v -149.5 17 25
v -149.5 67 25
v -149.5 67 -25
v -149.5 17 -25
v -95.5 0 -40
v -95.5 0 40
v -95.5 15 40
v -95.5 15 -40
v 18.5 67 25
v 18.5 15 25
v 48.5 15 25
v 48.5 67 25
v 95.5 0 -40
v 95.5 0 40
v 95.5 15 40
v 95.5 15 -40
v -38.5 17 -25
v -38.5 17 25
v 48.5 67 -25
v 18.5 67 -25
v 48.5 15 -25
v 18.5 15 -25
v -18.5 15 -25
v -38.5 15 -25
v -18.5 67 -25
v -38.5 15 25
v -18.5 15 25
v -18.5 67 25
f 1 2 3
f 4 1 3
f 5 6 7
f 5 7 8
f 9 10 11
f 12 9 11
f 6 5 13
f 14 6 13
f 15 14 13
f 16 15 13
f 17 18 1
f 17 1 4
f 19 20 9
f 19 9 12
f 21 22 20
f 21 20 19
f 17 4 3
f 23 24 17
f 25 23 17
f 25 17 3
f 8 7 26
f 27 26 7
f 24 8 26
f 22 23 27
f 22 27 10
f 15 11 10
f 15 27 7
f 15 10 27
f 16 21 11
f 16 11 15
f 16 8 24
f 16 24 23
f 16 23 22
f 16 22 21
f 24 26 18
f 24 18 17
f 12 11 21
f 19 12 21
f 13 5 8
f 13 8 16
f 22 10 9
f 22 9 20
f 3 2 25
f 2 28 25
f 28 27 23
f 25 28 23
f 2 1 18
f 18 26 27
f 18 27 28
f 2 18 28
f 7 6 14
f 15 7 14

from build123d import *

# Parameters (mm, degrees)
SKETCH1_W           = 191
SKETCH1_H           = 80
BOSS_EXTRUDE1_DEPTH = 15
SKETCH2_W           = 20
SKETCH2_H           = 50
SKETCH2_W_2         = 30
BOSS_EXTRUDE2_DEPTH = 52
SKETCH3_W           = 50
SKETCH3_H           = 50
BOSS_EXTRUDE3_DEPTH = 111


with BuildPart() as part:
    # Sketch1 → Boss-Extrude1 (new body)
    with BuildSketch(Plane(origin=(0, 0, 0), x_dir=(1, 0, 0), z_dir=(0, 1, 0))):
        Rectangle(SKETCH1_W, SKETCH1_H)
    extrude(amount=BOSS_EXTRUDE1_DEPTH)

    # Sketch2 → Boss-Extrude2 (add)
    with BuildSketch(Plane(origin=(0, 15, 0), x_dir=(1, 0, 0), z_dir=(0, 1, 0))):
        with Locations((-28.5, 0)):
            Rectangle(SKETCH2_W, SKETCH2_H)
        with Locations((33.5, 0)):
            Rectangle(SKETCH2_W_2, SKETCH2_H)
    extrude(amount=BOSS_EXTRUDE2_DEPTH)

    # Sketch3 → Boss-Extrude3 (add)
    with BuildSketch(Plane(origin=(-38.5, 0, 0), x_dir=(0, 0, -1), z_dir=(1, 0, 0))):
        with Locations((0, 42)):
            Rectangle(SKETCH3_W, SKETCH3_H)
    extrude(amount=-BOSS_EXTRUDE3_DEPTH)


solid = part.part
